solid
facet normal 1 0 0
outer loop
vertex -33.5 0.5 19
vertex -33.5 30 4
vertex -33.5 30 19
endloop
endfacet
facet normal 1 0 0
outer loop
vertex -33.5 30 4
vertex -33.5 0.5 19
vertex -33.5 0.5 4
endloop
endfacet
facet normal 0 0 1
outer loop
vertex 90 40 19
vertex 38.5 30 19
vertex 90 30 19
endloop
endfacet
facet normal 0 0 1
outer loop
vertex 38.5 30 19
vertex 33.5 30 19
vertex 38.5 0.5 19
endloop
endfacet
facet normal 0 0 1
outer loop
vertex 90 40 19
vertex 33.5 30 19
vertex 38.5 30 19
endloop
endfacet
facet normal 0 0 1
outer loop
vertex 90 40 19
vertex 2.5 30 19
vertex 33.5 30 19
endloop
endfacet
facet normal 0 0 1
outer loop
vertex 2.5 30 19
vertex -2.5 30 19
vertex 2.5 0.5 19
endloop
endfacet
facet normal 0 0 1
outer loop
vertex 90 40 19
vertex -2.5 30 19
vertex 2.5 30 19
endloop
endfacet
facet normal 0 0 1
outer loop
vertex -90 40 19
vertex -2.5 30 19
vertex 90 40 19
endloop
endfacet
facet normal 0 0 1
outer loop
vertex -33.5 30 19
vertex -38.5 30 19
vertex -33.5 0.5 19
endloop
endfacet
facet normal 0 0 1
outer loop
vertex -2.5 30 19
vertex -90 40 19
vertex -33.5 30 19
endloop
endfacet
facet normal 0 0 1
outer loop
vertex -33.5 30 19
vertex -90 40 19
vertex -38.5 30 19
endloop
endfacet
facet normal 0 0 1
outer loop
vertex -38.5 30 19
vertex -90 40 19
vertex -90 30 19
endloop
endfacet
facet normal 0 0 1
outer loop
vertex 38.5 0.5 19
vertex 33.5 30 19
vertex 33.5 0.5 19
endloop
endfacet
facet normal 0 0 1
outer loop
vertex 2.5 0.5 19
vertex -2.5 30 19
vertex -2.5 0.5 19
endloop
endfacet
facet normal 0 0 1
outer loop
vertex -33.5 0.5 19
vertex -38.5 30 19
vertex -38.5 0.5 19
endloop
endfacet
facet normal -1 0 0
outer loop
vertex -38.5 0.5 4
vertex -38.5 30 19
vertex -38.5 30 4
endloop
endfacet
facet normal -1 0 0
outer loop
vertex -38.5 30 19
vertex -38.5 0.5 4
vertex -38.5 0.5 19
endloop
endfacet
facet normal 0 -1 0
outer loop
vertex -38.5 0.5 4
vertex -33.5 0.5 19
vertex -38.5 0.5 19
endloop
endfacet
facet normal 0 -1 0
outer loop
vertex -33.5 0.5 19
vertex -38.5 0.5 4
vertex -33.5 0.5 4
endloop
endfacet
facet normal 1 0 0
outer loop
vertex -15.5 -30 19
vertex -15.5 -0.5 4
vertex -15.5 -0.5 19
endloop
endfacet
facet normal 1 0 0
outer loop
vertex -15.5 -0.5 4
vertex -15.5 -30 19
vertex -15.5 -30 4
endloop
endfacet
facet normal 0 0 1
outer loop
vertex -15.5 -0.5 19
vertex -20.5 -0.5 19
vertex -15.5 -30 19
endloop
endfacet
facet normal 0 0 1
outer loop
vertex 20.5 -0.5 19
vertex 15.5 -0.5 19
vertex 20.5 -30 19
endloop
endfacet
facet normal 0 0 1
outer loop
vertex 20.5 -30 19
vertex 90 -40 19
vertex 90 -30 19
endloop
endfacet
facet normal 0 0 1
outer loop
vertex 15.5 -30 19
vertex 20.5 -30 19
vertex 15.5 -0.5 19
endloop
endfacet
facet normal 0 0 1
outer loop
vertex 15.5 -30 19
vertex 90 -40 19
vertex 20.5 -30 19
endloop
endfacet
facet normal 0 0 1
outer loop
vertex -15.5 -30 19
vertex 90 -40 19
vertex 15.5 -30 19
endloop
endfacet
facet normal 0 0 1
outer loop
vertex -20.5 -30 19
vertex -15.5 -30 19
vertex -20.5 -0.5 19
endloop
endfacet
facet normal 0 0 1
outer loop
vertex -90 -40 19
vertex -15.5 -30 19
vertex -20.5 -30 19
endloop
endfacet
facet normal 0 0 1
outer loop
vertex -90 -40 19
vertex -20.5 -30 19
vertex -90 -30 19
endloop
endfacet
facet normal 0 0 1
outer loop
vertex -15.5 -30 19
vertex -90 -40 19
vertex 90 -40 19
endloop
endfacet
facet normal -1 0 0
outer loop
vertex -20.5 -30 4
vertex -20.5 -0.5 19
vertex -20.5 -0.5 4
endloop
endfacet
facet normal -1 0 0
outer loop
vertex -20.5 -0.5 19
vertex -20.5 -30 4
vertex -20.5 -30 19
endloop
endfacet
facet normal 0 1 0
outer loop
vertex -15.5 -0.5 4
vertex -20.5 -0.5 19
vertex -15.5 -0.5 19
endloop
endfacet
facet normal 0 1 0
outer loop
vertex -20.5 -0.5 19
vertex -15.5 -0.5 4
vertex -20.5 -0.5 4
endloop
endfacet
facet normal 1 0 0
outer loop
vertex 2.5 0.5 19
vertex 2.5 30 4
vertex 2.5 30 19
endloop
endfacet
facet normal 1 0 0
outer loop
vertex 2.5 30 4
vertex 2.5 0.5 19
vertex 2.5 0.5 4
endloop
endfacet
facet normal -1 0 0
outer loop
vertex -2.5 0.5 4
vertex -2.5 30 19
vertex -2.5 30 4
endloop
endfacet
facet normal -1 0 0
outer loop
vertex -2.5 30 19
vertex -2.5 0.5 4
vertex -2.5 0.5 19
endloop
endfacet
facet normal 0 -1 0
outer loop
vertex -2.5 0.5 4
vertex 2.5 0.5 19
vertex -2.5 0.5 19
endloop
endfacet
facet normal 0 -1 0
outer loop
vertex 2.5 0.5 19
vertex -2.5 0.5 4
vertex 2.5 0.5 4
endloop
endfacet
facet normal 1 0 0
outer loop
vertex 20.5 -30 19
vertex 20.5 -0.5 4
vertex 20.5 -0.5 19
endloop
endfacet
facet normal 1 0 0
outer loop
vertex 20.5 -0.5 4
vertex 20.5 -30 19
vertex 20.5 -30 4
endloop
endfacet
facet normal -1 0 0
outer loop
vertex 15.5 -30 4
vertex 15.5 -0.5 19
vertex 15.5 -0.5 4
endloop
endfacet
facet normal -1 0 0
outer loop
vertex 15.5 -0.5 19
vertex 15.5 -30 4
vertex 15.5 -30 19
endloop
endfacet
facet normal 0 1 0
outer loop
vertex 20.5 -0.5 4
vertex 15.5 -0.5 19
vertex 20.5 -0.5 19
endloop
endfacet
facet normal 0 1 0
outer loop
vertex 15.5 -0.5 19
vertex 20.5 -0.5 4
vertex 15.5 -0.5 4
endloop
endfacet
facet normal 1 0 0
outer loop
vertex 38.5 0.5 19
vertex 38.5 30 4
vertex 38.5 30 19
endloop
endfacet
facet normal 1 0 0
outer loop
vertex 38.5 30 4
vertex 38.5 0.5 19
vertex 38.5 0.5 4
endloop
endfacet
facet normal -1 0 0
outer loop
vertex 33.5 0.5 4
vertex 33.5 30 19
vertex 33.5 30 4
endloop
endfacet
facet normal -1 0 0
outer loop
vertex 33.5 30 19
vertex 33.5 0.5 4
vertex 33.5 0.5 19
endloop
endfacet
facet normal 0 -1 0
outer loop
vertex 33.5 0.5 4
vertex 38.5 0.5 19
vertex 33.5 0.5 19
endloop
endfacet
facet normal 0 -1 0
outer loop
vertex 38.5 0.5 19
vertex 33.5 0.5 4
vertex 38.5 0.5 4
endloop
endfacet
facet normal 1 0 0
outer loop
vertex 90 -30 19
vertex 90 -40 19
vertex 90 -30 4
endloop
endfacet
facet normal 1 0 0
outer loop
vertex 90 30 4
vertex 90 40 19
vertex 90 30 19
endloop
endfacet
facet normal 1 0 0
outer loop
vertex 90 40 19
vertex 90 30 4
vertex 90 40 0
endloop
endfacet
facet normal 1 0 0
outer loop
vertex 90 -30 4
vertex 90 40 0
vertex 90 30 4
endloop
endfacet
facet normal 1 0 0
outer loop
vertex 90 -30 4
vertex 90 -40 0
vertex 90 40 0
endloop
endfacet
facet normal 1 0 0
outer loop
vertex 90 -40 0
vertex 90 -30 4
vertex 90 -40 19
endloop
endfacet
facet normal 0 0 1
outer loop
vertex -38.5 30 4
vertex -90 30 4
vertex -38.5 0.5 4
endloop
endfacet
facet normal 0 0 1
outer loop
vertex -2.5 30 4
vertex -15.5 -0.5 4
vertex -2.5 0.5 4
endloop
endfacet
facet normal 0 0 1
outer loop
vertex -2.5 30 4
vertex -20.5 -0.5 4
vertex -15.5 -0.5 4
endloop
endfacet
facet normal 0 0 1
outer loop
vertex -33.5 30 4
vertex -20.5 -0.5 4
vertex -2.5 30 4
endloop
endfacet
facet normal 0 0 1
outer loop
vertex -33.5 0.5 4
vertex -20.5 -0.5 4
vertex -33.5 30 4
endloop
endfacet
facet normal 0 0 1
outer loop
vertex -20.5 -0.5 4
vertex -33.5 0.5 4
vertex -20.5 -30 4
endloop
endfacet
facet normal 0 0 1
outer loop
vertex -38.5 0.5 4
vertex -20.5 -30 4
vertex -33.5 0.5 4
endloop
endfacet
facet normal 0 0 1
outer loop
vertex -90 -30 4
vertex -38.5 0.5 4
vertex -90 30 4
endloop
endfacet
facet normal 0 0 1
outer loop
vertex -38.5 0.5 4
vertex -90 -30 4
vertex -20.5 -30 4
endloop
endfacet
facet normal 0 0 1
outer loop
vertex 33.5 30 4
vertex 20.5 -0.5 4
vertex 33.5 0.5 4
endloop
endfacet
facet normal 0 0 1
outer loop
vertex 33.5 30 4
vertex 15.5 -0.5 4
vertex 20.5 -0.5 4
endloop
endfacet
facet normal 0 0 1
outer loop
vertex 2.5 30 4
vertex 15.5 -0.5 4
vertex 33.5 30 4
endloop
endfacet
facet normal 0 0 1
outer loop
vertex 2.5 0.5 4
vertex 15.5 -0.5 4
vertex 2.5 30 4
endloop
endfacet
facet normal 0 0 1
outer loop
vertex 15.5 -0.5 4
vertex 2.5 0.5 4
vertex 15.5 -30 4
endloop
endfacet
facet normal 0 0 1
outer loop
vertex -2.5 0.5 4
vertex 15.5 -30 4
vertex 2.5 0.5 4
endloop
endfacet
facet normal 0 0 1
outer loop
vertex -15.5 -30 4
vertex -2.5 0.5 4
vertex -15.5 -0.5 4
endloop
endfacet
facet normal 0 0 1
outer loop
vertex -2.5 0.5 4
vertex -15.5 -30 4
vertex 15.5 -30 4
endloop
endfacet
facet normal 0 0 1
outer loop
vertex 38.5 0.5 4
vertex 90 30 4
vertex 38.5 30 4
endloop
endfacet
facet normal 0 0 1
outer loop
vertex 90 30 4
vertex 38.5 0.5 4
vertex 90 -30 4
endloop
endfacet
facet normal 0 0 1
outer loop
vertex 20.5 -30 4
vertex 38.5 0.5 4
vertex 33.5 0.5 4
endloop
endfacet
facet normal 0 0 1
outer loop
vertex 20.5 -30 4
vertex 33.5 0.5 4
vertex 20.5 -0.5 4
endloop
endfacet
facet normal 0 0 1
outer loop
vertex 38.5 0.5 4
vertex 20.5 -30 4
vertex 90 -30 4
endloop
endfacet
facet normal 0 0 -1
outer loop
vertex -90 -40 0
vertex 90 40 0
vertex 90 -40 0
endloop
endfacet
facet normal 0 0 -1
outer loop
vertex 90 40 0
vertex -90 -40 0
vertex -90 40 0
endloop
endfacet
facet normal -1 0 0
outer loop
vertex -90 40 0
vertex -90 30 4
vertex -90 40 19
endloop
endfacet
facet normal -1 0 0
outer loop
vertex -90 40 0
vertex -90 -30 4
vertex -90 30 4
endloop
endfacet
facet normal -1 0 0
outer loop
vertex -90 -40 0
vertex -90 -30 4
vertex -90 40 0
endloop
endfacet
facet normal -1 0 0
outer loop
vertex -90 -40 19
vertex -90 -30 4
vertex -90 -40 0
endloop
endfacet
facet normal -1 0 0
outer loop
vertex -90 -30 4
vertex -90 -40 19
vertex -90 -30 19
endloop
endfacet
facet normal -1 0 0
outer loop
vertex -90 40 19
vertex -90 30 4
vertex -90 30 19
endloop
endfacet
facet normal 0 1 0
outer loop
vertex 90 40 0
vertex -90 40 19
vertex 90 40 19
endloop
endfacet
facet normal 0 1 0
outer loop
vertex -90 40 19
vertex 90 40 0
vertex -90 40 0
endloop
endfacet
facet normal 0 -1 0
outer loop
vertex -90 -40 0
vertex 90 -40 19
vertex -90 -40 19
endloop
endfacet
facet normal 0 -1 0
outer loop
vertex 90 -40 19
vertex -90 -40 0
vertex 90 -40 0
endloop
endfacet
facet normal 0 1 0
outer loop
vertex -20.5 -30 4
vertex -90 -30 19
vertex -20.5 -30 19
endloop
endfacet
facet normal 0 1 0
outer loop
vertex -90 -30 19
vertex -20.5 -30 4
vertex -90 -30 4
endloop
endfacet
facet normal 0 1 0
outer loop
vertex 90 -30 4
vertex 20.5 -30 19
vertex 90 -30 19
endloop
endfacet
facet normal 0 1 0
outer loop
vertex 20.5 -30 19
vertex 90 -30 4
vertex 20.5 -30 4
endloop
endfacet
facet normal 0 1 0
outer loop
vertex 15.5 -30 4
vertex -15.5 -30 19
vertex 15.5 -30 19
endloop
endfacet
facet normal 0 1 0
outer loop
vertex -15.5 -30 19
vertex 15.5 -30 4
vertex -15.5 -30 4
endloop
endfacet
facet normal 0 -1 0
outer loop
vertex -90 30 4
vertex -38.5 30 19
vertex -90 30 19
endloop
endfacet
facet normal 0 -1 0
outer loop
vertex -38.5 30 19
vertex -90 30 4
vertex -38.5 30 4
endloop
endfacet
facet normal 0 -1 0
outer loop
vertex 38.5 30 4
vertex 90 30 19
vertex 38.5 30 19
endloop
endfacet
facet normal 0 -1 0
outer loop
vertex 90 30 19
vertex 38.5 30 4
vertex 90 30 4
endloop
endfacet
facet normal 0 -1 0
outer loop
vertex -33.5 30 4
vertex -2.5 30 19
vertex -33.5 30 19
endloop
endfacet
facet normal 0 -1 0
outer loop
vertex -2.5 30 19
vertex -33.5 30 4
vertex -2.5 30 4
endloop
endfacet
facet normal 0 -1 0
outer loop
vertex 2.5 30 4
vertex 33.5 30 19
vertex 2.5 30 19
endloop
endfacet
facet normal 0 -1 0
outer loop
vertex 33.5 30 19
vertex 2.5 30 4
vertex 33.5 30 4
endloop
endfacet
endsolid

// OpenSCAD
$fn = 32;

// ----------------------------------------------------------------------
// Rib frame 180 x 80 x 19
// 5 ribs at 18 mm pitch, staggered
// ----------------------------------------------------------------------

// --- parameters (mm) ---
frame = [180, 80, 4];  // base plate size (x, y, z)
rail_w = 10;           // side rail width
ribs = 5;              // number of ribs
rib_t = 5;             // rib thickness
rib_h = 15;            // rib height above the base plate
pitch = 18;            // pitch between rib centres

// --- derived feature positions (mm) ---
span = (ribs - 1) * pitch;          // = 72   distance between the outer ribs
origin_x = -span / 2;               // = -36   X of the first rib
rib_len = frame[1] / 2 - rail_w + 0.5;  // = 30.5   length of a staggered rib
rib_y = 0.5 + rib_len / 2;          // = 15.75   Y of a staggered rib centre
row_offset = 2 * rib_y;             // = 31.5   distance between the two rows
feature_centers = [
  [origin_x + 0 * pitch, rib_y],
  [origin_x + 1 * pitch, -rib_y],
  [origin_x + 2 * pitch, rib_y],
  [origin_x + 3 * pitch, -rib_y],
  [origin_x + 4 * pitch, rib_y]
];   // rib centre line, drives the rib loop

// base plate, two side rails, then the ribs read straight off feature_centers
union() {
  translate([-frame[0] / 2, -frame[1] / 2, 0]) cube(frame);
  translate([-frame[0] / 2, -frame[1] / 2, 0]) cube([frame[0], rail_w, frame[2] + rib_h]);
  translate([-frame[0] / 2, frame[1] / 2 - rail_w, 0]) cube([frame[0], rail_w, frame[2] + rib_h]);
  for (centre = feature_centers)
    translate([centre[0] - rib_t / 2, centre[1] - rib_len / 2, frame[2] - 1])
      cube([rib_t, rib_len, rib_h + 1]);
}
